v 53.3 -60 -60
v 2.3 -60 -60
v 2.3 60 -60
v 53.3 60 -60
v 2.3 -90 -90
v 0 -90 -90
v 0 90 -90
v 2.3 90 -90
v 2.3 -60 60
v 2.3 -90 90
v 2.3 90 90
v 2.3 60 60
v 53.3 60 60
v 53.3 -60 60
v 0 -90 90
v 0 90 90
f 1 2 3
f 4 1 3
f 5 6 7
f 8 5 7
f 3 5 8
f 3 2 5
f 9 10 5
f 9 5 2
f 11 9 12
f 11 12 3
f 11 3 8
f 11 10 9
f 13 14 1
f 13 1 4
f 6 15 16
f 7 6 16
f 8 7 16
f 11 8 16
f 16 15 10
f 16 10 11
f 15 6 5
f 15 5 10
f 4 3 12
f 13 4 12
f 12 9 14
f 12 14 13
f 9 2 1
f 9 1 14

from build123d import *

# Parameters (mm, degrees)
F0_W     = 180
F0_H     = 180
F1_DEPTH = 2.3
F2_W     = 120
F2_H     = 120
F3_DEPTH = 51


with BuildPart() as f1:
    # F0 (on Right) → F1 (new body)
    with BuildSketch(Plane.YZ):
        Rectangle(F0_W, F0_H)
    extrude(amount=F1_DEPTH)

    # F2 (on face) → F3 (join)
    with BuildSketch(Plane.YZ.offset(2.3)):
        Rectangle(F2_W, F2_H)
    extrude(amount=F3_DEPTH)


solid = f1.part
